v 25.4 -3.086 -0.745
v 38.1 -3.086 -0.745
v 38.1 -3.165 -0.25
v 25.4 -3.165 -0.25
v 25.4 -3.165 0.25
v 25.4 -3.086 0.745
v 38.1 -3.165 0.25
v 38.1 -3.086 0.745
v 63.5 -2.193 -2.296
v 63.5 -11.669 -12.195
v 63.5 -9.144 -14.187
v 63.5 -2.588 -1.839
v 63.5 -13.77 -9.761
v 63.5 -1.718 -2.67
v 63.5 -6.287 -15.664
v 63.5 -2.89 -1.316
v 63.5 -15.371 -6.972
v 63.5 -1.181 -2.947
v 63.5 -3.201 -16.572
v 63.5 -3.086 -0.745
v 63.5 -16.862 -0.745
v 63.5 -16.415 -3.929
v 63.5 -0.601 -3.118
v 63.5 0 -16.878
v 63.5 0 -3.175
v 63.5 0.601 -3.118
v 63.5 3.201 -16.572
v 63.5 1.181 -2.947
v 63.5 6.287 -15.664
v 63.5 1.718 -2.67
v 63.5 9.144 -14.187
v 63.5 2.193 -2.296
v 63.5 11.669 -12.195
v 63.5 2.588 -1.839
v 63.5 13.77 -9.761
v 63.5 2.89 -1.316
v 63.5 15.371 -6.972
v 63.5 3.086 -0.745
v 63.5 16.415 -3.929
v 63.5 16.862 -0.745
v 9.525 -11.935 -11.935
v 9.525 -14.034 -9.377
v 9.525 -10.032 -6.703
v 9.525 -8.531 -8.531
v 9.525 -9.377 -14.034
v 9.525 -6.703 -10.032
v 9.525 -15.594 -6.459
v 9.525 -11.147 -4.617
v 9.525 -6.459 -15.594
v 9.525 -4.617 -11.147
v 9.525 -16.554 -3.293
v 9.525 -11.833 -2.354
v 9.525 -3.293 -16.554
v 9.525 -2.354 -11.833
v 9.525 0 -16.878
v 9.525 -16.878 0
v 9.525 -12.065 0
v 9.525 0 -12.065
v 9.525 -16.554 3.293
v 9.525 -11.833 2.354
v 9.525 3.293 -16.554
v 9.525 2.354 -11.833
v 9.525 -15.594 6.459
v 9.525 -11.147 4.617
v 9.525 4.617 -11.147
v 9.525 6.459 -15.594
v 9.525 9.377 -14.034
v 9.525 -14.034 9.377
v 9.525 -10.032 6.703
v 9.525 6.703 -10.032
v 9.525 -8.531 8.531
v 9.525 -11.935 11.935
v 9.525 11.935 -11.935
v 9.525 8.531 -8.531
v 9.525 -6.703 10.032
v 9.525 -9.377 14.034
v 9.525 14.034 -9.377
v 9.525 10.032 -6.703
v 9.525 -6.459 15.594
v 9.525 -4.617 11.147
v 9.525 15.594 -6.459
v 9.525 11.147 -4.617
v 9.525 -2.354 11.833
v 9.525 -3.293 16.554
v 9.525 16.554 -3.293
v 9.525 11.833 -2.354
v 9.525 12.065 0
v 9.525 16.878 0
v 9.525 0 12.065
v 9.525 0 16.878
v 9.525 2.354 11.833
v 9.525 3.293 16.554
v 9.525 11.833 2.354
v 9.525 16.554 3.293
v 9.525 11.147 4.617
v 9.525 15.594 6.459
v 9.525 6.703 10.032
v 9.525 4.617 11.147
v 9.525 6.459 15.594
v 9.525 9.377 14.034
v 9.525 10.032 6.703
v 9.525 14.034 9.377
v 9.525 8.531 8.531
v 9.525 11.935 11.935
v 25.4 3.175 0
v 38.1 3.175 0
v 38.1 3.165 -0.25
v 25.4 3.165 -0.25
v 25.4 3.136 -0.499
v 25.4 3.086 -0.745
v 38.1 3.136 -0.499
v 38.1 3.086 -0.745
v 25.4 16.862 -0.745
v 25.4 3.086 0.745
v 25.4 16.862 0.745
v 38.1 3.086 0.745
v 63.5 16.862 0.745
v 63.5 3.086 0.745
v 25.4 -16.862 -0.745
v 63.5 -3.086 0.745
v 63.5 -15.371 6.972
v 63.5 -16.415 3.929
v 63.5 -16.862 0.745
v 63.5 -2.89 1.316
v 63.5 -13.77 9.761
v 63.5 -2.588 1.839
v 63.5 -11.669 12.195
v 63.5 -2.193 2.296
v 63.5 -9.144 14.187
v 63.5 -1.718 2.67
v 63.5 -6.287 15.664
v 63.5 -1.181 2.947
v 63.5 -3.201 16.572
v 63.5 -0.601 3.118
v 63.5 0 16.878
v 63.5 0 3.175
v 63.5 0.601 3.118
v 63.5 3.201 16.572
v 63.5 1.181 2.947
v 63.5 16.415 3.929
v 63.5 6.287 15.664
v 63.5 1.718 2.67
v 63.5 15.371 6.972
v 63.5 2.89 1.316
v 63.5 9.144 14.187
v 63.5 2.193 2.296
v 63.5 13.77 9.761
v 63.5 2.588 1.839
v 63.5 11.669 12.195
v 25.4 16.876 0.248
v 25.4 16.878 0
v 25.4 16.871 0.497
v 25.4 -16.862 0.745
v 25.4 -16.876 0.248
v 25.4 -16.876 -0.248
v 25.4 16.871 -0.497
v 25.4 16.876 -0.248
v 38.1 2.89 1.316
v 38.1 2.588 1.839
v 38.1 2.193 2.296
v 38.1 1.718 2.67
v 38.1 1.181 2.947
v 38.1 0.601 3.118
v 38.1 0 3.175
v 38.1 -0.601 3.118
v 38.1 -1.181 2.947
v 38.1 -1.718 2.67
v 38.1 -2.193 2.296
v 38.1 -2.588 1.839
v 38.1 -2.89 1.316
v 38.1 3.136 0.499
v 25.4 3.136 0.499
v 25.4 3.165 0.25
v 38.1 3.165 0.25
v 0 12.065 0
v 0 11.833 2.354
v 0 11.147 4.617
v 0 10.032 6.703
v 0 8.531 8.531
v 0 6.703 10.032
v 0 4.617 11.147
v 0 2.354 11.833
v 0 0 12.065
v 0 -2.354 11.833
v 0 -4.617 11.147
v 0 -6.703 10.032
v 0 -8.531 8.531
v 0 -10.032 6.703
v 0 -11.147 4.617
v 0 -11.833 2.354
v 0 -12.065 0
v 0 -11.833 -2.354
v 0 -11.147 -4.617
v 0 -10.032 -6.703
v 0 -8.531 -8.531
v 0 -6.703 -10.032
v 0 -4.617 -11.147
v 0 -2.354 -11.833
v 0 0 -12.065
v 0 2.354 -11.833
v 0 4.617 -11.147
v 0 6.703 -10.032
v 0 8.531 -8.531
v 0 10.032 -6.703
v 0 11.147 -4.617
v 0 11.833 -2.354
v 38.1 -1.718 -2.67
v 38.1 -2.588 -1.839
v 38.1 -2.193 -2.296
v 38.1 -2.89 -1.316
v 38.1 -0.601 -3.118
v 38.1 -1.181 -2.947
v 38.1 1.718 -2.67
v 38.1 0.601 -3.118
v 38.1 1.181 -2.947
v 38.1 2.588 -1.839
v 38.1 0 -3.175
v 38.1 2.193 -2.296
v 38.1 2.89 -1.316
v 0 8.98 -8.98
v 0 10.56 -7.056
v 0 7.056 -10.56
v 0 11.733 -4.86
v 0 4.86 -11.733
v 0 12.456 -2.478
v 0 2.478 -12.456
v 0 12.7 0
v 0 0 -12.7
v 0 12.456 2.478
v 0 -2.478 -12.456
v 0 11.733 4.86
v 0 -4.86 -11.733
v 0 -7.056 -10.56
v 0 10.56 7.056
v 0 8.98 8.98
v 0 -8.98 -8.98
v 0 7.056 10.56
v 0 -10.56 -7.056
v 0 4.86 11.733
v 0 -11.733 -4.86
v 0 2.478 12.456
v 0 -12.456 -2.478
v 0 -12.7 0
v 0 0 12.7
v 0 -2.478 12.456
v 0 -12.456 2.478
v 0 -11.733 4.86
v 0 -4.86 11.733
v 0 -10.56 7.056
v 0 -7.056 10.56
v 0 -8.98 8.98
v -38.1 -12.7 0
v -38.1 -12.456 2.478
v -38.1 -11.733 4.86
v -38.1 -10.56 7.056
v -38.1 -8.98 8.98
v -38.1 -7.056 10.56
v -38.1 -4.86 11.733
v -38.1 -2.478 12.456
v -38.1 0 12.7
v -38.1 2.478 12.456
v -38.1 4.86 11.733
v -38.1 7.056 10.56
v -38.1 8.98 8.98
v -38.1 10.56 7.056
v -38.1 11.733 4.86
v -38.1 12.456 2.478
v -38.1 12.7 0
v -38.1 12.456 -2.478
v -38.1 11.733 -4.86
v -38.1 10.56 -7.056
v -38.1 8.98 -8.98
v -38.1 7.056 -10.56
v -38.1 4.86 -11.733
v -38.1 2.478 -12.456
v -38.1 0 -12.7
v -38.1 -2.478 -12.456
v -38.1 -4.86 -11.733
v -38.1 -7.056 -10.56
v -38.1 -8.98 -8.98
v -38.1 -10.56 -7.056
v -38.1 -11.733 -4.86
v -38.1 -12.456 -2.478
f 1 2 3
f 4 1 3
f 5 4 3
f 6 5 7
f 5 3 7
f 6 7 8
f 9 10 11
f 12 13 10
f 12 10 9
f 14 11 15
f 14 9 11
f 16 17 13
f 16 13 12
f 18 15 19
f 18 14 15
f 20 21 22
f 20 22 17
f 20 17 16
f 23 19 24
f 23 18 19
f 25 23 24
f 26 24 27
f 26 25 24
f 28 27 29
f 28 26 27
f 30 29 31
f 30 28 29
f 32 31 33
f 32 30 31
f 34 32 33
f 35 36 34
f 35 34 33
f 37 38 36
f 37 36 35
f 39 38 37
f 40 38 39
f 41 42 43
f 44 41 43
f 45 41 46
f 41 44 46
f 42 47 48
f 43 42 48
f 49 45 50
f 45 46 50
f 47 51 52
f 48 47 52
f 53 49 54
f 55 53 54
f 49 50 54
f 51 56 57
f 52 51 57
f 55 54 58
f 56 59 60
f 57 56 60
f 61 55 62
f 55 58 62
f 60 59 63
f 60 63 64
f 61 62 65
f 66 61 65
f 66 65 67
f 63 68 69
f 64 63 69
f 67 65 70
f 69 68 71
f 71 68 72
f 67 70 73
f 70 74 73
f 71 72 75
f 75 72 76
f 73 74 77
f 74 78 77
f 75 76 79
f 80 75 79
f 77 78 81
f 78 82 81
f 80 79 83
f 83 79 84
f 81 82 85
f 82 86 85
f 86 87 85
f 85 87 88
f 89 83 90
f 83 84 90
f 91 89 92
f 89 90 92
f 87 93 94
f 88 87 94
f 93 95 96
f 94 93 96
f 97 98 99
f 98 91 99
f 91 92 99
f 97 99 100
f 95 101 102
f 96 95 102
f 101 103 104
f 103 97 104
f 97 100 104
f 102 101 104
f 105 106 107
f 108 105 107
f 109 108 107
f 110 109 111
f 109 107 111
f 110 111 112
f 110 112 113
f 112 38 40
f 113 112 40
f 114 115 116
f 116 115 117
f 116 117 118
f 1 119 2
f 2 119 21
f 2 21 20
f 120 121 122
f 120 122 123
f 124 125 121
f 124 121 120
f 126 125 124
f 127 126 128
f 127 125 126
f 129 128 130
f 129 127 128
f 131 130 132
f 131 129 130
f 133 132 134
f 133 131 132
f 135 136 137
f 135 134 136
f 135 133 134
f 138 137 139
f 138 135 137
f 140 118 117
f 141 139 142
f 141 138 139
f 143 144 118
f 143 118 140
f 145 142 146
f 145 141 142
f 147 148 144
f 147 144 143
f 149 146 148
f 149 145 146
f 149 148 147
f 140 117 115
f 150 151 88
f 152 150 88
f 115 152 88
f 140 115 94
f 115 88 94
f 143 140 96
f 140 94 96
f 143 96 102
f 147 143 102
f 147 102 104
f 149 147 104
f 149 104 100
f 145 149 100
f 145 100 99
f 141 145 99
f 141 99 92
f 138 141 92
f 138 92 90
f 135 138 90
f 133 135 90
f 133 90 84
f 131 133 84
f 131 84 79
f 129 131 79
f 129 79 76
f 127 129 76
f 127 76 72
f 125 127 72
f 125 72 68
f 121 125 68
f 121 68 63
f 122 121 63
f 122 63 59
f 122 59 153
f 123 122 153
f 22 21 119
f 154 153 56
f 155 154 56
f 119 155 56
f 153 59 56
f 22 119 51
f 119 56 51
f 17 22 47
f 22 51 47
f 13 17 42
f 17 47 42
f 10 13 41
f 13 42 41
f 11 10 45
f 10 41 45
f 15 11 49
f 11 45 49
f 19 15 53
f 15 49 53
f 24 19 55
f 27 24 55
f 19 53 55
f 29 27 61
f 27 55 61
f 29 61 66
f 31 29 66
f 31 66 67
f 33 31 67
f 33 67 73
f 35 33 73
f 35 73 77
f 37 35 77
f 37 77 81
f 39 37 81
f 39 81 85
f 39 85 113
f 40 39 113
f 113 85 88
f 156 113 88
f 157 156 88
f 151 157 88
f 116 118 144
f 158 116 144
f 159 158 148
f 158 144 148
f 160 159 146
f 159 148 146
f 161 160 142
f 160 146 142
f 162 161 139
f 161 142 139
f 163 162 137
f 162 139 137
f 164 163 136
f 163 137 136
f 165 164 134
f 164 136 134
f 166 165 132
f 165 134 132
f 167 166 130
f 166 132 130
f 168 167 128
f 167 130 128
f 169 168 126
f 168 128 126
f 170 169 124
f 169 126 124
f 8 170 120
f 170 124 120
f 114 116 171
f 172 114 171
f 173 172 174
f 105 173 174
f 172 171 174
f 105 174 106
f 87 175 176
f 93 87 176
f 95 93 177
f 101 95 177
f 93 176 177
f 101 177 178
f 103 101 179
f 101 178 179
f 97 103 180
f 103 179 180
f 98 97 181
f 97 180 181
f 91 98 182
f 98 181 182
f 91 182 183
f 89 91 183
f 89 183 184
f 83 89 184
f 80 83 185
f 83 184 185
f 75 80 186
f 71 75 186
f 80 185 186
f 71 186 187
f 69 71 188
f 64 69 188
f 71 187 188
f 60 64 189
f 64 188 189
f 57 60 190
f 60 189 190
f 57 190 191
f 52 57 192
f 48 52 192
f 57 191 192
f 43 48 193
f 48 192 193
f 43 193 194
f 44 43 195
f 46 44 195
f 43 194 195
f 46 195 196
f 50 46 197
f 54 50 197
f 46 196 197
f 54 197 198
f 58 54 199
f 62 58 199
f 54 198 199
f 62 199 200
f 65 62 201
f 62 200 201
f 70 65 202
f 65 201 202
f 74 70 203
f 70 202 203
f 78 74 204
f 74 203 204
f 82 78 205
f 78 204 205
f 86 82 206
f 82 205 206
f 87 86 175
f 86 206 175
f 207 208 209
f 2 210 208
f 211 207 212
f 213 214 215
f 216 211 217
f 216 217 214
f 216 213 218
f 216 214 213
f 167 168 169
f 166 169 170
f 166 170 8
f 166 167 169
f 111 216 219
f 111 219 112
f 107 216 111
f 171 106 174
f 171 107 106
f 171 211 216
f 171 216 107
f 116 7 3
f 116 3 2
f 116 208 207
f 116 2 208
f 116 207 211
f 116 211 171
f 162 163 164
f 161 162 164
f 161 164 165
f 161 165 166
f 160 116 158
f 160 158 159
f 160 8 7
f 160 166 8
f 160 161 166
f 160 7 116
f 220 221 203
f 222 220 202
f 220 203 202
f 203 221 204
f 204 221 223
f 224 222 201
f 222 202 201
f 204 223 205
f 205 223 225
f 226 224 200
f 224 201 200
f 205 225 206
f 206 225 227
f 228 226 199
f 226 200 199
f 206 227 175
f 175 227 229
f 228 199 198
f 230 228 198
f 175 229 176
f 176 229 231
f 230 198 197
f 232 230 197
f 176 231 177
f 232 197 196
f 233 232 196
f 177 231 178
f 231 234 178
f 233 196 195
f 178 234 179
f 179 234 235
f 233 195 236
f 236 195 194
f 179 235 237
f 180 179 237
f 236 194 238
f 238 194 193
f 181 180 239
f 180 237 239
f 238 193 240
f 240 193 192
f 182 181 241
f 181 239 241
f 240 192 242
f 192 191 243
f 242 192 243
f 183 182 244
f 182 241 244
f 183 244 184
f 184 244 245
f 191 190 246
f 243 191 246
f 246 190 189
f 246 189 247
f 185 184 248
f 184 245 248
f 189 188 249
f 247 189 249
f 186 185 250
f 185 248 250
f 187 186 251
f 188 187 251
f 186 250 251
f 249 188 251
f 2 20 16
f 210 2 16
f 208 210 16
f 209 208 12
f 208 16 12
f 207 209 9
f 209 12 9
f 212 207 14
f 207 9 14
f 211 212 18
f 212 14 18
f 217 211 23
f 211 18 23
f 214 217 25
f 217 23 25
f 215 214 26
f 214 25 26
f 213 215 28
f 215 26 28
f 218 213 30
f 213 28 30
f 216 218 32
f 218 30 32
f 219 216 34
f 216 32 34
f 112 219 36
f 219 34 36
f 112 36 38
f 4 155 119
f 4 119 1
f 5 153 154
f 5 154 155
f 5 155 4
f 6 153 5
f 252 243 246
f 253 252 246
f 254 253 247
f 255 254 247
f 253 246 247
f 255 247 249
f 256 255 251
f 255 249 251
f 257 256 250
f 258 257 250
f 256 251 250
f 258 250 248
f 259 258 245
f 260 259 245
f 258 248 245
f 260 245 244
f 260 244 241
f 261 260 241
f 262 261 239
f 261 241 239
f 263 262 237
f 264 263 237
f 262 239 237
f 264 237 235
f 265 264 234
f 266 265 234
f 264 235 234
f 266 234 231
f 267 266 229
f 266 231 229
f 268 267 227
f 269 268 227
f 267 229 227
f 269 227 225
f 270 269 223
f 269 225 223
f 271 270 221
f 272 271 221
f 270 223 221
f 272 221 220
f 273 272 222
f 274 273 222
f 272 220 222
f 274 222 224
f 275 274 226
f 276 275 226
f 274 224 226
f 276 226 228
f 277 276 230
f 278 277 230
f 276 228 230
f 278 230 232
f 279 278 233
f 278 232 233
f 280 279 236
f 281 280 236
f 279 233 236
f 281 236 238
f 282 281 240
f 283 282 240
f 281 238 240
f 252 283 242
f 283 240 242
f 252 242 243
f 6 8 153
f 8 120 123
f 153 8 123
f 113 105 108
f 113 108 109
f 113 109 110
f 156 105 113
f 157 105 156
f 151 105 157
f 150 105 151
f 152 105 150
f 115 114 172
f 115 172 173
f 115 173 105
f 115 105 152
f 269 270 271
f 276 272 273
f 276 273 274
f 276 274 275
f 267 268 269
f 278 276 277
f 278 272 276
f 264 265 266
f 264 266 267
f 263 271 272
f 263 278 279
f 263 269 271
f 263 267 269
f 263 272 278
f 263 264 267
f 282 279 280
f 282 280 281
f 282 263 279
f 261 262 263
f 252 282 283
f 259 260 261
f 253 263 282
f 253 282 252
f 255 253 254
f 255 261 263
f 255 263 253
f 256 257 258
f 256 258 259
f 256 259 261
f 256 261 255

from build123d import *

# Parameters (mm, degrees)
F0_R     = 12.065
F1_DEPTH = 9.525
F2_R     = 16.8783
F2_R_2   = 12.065
F3_DEPTH = 53.975
F4_R     = 12.7
F4_R_2   = 12.065
F5_DEPTH = 38.1
F6_R     = 3.175
F7_DEPTH = 25.4
F9_DEPTH = 38.1


with BuildPart() as f1:
    # F0 (on Right) → F1 (new body)
    with BuildSketch(Plane.YZ):
        Circle(F0_R)
    extrude(amount=F1_DEPTH)

    # F2 (on face) → F3 (join)
    with BuildSketch(Plane.YZ.offset(9.525)):
        Circle(F2_R)
        Circle(F2_R_2, mode=Mode.SUBTRACT)
        Circle(F2_R_2)
    extrude(amount=F3_DEPTH)

    # F4 (on face) → F5 (join)
    with BuildSketch(Plane(origin=(0, 0, 0), x_dir=(0, -1, 0), z_dir=(-1, 0, 0))):
        Circle(F4_R)
        Circle(F4_R_2, mode=Mode.SUBTRACT)
        Circle(F4_R_2)
    extrude(amount=F5_DEPTH)

    # F6 (on face) → F7 (cut)
    with BuildSketch(Plane.YZ.offset(63.5)):
        Circle(F6_R)
    extrude(amount=-F7_DEPTH, mode=Mode.SUBTRACT)

    # F8 (on face) → F9 (cut)
    with BuildSketch(Plane.YZ.offset(63.5)):
        with BuildLine():
            ThreePointArc((-16.8618667917, 0.7446201635), (-16.8783, 0), (-16.8618667917, -0.7446201635))
            Line((-16.8618667917, -0.7446201635), (-3.086448738, -0.7446201635))
            ThreePointArc((-3.086448738, -0.7446201635), (-3.175, 0), (-3.086448738, 0.7446201635))
            Line((-3.086448738, 0.7446201635), (-16.8618667917, 0.7446201635))
        make_face()
        with BuildLine():
            Line((3.086448738, -0.7446201635), (16.8618667917, -0.7446201635))
            ThreePointArc((16.8618667917, -0.7446201635), (16.8741911978, -0.3724007378), (16.8783, 0))
            ThreePointArc((16.8783, 0), (16.8741911978, 0.3724007378), (16.8618667917, 0.7446201635))
            Line((16.8618667917, 0.7446201635), (3.086448738, 0.7446201635))
            ThreePointArc((3.086448738, 0.7446201635), (3.1527844632, 0.3749334987), (3.175, 0))
            ThreePointArc((3.175, 0), (3.1527844632, -0.3749334987), (3.086448738, -0.7446201635))
        make_face()
    extrude(amount=-F9_DEPTH, mode=Mode.SUBTRACT)


solid = f1.part
